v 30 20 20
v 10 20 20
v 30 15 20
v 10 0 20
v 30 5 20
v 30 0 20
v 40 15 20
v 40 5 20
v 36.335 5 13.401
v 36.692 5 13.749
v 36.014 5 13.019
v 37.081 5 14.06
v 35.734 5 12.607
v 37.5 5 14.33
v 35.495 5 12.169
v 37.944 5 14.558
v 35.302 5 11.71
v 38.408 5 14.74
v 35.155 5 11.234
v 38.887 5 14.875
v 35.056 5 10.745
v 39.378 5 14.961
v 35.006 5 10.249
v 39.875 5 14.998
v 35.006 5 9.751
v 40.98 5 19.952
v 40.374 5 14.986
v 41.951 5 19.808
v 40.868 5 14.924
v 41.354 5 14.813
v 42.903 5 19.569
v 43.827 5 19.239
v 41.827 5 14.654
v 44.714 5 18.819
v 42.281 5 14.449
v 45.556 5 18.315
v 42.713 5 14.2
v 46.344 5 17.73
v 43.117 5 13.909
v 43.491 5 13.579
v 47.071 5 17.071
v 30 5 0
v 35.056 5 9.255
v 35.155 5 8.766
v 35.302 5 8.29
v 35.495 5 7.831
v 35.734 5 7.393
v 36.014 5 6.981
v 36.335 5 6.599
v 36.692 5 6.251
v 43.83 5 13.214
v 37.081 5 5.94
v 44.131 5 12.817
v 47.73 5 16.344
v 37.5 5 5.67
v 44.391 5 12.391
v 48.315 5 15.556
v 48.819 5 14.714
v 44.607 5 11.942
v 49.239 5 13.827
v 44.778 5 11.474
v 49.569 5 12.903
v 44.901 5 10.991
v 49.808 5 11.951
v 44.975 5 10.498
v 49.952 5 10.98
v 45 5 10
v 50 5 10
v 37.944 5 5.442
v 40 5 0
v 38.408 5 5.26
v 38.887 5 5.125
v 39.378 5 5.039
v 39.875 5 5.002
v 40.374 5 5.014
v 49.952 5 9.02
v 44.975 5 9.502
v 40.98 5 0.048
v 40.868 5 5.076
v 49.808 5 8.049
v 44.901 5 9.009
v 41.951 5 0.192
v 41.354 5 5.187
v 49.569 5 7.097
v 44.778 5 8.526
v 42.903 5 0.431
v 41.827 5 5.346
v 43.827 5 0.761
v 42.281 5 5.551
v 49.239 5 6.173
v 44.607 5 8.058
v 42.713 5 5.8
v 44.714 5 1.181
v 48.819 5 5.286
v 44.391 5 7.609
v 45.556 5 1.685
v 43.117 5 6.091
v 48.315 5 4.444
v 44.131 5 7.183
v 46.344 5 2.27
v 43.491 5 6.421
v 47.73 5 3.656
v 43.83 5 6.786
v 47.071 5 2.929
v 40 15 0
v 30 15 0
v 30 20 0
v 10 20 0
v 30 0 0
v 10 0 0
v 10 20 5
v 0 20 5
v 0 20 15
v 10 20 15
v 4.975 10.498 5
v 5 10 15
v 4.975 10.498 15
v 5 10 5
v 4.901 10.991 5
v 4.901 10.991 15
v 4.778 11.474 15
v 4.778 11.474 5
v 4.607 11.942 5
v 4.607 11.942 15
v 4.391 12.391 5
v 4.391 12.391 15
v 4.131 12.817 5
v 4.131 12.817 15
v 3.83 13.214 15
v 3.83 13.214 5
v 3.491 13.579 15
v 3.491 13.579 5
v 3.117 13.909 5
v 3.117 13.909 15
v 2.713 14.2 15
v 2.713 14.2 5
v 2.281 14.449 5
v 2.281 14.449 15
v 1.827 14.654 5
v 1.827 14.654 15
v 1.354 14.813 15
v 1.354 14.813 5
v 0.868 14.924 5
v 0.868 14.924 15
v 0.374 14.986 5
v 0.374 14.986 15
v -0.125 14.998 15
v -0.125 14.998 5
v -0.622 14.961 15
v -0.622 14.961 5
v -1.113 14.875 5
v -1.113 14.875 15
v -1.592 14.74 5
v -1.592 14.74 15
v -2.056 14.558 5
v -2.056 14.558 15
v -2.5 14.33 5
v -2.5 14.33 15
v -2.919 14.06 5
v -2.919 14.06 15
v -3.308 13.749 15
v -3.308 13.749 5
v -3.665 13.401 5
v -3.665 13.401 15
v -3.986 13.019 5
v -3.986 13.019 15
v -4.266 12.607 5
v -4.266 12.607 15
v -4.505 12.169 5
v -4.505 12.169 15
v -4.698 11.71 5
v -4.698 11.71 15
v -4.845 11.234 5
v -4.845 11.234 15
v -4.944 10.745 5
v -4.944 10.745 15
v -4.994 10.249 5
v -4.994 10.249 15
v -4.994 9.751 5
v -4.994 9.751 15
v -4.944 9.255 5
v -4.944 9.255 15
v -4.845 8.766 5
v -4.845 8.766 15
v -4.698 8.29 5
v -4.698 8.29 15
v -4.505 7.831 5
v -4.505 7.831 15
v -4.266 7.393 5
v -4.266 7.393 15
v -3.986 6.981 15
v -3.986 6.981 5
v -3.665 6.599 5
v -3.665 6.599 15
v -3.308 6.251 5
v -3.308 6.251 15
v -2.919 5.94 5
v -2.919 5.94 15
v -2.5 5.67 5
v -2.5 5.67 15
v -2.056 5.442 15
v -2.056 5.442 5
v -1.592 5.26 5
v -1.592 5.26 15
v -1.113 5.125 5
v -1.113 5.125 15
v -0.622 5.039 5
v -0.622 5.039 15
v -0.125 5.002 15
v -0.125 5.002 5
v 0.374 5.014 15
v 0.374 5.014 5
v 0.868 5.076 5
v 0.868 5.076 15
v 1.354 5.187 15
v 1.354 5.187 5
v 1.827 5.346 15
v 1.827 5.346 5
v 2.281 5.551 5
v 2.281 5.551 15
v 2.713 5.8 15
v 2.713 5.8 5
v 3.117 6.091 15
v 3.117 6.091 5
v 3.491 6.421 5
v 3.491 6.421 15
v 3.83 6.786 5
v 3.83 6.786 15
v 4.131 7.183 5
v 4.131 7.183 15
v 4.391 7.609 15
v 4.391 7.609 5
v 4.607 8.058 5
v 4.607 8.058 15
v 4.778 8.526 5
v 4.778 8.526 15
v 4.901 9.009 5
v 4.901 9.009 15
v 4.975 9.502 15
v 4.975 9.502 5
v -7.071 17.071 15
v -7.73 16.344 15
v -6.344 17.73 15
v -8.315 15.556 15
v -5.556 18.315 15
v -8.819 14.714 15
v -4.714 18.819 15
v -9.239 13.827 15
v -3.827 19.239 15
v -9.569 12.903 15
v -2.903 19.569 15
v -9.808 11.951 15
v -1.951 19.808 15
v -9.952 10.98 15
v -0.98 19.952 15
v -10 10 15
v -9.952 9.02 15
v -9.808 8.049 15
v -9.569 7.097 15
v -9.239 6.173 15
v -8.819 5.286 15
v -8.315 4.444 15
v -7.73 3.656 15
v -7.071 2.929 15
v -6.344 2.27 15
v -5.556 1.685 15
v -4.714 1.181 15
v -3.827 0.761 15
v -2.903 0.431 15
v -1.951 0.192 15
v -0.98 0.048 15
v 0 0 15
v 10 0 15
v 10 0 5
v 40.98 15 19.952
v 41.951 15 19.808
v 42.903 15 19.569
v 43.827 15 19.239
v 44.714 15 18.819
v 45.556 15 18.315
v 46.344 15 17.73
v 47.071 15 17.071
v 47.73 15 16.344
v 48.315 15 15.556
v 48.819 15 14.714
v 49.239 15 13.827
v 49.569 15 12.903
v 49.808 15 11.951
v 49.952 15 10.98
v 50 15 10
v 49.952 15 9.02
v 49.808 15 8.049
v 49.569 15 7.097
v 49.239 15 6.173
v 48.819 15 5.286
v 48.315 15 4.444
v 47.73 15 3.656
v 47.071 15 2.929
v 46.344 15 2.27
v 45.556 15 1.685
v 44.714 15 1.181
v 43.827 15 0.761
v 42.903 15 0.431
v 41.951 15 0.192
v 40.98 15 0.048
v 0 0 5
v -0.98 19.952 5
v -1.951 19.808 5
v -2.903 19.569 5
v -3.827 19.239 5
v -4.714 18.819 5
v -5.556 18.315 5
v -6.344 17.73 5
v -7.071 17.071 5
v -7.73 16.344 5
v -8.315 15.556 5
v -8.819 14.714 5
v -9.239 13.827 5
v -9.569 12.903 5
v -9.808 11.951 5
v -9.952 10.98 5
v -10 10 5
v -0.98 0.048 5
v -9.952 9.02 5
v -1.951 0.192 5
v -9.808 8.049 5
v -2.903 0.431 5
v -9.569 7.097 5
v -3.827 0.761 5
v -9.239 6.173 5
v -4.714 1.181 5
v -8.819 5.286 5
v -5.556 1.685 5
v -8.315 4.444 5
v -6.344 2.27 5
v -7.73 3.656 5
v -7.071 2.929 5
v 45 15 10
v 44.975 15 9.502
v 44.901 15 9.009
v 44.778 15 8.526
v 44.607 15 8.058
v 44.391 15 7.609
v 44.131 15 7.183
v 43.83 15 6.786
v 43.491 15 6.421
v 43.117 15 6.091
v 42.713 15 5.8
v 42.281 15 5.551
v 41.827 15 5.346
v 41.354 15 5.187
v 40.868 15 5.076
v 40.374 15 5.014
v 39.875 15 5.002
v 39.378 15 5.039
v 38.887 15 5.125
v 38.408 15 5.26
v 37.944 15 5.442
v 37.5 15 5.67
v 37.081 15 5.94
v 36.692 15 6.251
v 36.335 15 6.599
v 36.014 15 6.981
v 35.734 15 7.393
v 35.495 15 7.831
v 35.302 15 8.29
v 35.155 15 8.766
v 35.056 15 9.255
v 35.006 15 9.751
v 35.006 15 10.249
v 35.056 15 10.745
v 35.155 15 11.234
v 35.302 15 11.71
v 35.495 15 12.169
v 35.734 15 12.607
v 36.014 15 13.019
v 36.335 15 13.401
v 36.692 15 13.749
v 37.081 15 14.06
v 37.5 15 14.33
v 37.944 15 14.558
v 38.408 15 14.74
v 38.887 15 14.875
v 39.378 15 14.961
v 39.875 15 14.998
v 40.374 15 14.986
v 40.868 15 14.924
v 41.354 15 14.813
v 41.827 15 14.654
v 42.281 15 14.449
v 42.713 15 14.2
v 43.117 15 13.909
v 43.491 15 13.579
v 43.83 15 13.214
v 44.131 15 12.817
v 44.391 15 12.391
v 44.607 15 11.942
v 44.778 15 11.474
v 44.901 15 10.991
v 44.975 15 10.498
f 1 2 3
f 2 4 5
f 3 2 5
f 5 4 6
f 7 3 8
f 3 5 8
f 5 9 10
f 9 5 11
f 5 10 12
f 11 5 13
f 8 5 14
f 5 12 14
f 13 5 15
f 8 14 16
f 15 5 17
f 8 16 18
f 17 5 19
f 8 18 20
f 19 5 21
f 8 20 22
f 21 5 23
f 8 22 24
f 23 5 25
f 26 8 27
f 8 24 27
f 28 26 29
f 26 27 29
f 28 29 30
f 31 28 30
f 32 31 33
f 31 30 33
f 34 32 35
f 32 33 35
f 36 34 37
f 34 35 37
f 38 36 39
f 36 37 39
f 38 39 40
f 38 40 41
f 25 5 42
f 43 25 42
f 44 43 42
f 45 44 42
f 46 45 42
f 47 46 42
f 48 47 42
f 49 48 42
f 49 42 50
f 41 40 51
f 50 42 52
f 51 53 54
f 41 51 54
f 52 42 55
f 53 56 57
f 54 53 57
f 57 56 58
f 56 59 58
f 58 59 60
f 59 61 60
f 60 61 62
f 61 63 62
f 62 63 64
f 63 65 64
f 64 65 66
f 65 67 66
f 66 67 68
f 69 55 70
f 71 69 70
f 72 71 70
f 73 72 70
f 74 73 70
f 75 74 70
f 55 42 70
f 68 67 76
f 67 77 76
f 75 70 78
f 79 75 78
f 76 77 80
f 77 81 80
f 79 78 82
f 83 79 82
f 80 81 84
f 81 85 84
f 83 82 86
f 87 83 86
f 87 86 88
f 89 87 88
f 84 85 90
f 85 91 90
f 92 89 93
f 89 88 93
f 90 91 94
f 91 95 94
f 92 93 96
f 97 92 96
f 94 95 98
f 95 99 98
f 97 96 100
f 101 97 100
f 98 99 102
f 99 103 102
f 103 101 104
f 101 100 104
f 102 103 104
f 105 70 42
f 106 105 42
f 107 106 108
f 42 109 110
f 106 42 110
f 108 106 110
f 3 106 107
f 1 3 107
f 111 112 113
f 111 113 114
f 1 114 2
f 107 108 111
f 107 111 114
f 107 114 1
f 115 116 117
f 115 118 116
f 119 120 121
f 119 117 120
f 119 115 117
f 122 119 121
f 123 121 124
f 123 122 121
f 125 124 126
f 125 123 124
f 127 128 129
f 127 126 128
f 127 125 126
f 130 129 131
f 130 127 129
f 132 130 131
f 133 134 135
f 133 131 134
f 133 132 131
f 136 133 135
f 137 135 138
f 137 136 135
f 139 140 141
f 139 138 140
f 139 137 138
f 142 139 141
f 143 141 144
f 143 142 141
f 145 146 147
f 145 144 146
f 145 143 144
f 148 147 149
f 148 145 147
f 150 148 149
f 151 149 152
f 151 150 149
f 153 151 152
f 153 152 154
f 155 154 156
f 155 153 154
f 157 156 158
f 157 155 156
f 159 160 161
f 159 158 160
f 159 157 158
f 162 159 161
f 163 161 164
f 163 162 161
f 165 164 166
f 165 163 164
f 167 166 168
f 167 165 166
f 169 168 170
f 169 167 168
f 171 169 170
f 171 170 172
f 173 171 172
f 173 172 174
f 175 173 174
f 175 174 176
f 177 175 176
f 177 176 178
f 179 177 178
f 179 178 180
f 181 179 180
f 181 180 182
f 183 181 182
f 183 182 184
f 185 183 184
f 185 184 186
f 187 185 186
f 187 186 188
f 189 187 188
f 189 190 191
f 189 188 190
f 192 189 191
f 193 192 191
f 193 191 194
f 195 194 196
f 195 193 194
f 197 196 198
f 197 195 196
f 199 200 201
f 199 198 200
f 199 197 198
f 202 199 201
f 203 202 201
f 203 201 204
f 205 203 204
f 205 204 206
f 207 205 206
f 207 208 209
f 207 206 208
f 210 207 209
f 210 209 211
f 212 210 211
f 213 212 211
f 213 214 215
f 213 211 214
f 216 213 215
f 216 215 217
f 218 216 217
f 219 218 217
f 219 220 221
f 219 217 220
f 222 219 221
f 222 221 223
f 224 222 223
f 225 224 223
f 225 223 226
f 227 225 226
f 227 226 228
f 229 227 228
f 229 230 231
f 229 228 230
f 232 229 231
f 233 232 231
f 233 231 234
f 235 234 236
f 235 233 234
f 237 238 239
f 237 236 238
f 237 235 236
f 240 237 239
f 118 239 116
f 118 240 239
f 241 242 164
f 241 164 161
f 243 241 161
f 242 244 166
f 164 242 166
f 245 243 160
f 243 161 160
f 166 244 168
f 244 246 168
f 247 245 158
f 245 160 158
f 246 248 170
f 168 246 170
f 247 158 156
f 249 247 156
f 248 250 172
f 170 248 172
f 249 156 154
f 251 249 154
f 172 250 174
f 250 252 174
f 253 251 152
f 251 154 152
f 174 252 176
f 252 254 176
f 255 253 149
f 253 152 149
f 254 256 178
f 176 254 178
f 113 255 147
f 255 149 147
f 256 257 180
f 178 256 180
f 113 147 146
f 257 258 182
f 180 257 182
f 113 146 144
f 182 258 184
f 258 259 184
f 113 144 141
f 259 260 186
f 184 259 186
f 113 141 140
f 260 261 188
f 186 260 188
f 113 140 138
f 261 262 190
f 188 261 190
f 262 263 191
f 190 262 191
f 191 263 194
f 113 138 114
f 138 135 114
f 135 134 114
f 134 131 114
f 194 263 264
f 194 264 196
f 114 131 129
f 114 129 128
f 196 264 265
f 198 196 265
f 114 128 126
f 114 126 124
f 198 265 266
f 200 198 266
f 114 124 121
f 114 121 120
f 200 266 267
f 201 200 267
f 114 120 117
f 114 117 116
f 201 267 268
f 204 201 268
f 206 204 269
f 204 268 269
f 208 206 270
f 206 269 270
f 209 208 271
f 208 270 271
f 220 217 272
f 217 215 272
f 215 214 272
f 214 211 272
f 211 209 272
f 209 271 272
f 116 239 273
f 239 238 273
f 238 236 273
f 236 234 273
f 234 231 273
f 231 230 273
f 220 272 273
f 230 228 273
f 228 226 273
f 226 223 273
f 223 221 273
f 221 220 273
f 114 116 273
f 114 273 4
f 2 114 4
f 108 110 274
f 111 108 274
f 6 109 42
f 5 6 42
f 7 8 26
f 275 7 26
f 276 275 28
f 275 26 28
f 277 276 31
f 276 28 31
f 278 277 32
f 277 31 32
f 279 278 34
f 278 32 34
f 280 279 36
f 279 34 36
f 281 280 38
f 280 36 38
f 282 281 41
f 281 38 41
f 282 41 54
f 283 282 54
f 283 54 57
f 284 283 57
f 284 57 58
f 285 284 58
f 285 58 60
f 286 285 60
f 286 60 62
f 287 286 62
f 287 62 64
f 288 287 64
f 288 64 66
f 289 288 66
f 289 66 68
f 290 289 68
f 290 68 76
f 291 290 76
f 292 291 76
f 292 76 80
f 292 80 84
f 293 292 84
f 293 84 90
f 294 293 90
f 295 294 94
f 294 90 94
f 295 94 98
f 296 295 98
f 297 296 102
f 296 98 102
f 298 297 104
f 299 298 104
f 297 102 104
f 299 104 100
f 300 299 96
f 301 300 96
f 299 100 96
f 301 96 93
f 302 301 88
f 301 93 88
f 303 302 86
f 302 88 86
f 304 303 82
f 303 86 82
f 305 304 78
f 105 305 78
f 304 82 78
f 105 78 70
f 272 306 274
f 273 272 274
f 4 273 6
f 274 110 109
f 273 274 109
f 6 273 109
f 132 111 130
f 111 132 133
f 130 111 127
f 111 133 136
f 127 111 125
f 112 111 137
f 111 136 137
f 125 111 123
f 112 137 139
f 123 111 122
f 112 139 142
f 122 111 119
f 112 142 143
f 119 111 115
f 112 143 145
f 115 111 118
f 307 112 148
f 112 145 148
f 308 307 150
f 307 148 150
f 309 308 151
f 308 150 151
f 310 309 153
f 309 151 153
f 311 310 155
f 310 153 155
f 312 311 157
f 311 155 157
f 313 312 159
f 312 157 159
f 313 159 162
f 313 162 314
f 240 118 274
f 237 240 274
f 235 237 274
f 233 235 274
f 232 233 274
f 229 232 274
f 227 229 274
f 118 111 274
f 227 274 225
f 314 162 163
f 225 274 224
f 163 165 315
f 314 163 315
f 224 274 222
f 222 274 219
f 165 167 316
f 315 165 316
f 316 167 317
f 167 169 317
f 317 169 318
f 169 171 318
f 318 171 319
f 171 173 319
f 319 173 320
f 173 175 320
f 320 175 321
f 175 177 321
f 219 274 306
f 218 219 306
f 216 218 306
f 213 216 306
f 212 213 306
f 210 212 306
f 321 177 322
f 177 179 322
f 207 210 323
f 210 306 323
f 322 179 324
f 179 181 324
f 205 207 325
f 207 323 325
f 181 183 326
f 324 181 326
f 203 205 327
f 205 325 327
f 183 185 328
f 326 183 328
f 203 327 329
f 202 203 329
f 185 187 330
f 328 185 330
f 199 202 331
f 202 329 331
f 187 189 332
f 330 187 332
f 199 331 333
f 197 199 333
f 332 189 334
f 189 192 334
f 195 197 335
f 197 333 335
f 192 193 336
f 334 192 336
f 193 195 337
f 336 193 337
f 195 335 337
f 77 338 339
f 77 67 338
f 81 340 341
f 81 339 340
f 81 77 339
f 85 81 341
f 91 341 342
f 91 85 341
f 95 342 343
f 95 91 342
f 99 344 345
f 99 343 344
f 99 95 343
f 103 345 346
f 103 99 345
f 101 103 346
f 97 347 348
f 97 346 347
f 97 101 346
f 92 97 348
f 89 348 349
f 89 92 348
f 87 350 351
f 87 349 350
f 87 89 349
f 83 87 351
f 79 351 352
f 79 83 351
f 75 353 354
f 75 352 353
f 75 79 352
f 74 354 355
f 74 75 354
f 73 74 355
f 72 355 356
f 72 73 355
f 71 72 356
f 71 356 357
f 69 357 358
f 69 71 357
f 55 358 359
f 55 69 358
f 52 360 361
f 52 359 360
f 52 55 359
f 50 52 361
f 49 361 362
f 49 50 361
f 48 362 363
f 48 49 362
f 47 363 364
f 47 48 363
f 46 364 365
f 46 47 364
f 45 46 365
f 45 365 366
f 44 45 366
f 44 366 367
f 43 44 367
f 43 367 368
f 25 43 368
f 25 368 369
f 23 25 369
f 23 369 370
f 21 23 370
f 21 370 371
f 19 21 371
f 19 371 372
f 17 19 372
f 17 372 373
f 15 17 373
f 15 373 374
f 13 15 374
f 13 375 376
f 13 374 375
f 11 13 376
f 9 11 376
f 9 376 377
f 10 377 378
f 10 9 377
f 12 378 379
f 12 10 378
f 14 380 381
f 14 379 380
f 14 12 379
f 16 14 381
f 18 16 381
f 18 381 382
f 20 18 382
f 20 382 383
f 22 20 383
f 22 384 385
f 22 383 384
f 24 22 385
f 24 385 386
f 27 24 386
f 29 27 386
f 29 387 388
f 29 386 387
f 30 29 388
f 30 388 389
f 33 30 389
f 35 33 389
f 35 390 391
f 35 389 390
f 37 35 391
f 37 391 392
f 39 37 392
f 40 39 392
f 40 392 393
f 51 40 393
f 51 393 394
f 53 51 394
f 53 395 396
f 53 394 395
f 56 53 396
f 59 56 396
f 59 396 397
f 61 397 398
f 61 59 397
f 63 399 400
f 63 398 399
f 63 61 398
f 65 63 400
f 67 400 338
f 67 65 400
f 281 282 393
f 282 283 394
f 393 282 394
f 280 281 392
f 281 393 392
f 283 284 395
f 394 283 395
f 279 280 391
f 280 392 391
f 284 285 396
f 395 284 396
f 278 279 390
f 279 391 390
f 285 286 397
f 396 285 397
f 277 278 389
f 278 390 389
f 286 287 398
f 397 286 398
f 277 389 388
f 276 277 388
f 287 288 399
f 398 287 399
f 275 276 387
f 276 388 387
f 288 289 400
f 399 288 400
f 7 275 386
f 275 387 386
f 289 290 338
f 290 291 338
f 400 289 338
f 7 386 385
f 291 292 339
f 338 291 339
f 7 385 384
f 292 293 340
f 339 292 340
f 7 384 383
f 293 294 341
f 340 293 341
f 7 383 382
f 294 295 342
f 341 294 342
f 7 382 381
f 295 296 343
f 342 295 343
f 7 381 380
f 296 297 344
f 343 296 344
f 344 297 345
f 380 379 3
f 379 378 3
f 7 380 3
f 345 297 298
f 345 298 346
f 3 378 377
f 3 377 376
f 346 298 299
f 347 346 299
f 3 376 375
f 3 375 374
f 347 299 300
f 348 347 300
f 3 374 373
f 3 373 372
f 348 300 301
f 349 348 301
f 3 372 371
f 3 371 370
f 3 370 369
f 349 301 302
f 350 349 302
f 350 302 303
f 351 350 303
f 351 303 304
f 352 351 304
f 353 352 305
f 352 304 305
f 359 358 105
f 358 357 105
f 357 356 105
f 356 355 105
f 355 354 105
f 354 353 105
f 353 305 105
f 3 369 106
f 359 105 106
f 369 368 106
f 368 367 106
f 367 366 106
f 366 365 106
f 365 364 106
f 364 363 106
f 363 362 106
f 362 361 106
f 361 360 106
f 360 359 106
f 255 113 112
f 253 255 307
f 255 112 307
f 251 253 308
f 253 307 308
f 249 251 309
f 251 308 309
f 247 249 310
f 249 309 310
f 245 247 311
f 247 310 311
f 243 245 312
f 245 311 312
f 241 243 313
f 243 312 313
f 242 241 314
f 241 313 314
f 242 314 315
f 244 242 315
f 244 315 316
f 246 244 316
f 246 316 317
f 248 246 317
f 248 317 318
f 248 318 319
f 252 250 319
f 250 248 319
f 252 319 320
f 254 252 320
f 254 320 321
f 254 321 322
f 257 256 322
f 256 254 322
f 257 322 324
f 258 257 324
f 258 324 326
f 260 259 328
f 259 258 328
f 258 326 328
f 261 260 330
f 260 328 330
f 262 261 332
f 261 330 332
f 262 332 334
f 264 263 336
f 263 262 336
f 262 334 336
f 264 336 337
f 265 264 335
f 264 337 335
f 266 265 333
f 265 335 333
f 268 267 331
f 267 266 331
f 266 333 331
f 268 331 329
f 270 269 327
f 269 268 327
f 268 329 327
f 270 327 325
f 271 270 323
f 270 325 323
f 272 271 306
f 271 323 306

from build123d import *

# Parameters (mm, degrees)
ESQUISSE1_R        = 5
BOSS_EXTRU_1_DEPTH = 20
ESQUISSE2_R        = 5
BOSS_EXTRU_2_DEPTH = 20


with BuildPart() as part:
    # Esquisse1 → Boss.-Extru.1 (new body)
    with BuildSketch(Plane.XY):
        with BuildLine():
            Line((50, 5), (50, 15))
            Line((50, 15), (30, 15))
            Line((30, 15), (30, 20))
            Line((30, 20), (0, 20))
            ThreePointArc((0, 20), (-10, 10), (0, 0))
            Line((0, 0), (30, 0))
            Line((30, 0), (30, 5))
            Line((30, 5), (50, 5))
        make_face()
        with Locations((0, 10)):
            Circle(ESQUISSE1_R, mode=Mode.SUBTRACT)
    extrude(amount=BOSS_EXTRU_1_DEPTH)


with BuildPart() as body_2:
    # Esquisse2 → Boss.-Extru.2 (new body)
    with BuildSketch(Plane(origin=(0, 0, 0), x_dir=(1, 0, 0), z_dir=(0, 1, 0))):
        with BuildLine():
            Line((-10, -5), (-10, -15))
            Line((-10, -15), (10, -15))
            Line((10, -15), (10, -20))
            Line((10, -20), (40, -20))
            ThreePointArc((40, -20), (50, -10), (40, 0))
            Line((40, 0), (10, 0))
            Line((10, 0), (10, -5))
            Line((10, -5), (-10, -5))
        make_face()
        with Locations((40, -10)):
            Circle(ESQUISSE2_R, mode=Mode.SUBTRACT)
    extrude(amount=BOSS_EXTRU_2_DEPTH)

    # Combiner1: intersect part
    add(part.part, mode=Mode.INTERSECT)


solid = body_2.part
